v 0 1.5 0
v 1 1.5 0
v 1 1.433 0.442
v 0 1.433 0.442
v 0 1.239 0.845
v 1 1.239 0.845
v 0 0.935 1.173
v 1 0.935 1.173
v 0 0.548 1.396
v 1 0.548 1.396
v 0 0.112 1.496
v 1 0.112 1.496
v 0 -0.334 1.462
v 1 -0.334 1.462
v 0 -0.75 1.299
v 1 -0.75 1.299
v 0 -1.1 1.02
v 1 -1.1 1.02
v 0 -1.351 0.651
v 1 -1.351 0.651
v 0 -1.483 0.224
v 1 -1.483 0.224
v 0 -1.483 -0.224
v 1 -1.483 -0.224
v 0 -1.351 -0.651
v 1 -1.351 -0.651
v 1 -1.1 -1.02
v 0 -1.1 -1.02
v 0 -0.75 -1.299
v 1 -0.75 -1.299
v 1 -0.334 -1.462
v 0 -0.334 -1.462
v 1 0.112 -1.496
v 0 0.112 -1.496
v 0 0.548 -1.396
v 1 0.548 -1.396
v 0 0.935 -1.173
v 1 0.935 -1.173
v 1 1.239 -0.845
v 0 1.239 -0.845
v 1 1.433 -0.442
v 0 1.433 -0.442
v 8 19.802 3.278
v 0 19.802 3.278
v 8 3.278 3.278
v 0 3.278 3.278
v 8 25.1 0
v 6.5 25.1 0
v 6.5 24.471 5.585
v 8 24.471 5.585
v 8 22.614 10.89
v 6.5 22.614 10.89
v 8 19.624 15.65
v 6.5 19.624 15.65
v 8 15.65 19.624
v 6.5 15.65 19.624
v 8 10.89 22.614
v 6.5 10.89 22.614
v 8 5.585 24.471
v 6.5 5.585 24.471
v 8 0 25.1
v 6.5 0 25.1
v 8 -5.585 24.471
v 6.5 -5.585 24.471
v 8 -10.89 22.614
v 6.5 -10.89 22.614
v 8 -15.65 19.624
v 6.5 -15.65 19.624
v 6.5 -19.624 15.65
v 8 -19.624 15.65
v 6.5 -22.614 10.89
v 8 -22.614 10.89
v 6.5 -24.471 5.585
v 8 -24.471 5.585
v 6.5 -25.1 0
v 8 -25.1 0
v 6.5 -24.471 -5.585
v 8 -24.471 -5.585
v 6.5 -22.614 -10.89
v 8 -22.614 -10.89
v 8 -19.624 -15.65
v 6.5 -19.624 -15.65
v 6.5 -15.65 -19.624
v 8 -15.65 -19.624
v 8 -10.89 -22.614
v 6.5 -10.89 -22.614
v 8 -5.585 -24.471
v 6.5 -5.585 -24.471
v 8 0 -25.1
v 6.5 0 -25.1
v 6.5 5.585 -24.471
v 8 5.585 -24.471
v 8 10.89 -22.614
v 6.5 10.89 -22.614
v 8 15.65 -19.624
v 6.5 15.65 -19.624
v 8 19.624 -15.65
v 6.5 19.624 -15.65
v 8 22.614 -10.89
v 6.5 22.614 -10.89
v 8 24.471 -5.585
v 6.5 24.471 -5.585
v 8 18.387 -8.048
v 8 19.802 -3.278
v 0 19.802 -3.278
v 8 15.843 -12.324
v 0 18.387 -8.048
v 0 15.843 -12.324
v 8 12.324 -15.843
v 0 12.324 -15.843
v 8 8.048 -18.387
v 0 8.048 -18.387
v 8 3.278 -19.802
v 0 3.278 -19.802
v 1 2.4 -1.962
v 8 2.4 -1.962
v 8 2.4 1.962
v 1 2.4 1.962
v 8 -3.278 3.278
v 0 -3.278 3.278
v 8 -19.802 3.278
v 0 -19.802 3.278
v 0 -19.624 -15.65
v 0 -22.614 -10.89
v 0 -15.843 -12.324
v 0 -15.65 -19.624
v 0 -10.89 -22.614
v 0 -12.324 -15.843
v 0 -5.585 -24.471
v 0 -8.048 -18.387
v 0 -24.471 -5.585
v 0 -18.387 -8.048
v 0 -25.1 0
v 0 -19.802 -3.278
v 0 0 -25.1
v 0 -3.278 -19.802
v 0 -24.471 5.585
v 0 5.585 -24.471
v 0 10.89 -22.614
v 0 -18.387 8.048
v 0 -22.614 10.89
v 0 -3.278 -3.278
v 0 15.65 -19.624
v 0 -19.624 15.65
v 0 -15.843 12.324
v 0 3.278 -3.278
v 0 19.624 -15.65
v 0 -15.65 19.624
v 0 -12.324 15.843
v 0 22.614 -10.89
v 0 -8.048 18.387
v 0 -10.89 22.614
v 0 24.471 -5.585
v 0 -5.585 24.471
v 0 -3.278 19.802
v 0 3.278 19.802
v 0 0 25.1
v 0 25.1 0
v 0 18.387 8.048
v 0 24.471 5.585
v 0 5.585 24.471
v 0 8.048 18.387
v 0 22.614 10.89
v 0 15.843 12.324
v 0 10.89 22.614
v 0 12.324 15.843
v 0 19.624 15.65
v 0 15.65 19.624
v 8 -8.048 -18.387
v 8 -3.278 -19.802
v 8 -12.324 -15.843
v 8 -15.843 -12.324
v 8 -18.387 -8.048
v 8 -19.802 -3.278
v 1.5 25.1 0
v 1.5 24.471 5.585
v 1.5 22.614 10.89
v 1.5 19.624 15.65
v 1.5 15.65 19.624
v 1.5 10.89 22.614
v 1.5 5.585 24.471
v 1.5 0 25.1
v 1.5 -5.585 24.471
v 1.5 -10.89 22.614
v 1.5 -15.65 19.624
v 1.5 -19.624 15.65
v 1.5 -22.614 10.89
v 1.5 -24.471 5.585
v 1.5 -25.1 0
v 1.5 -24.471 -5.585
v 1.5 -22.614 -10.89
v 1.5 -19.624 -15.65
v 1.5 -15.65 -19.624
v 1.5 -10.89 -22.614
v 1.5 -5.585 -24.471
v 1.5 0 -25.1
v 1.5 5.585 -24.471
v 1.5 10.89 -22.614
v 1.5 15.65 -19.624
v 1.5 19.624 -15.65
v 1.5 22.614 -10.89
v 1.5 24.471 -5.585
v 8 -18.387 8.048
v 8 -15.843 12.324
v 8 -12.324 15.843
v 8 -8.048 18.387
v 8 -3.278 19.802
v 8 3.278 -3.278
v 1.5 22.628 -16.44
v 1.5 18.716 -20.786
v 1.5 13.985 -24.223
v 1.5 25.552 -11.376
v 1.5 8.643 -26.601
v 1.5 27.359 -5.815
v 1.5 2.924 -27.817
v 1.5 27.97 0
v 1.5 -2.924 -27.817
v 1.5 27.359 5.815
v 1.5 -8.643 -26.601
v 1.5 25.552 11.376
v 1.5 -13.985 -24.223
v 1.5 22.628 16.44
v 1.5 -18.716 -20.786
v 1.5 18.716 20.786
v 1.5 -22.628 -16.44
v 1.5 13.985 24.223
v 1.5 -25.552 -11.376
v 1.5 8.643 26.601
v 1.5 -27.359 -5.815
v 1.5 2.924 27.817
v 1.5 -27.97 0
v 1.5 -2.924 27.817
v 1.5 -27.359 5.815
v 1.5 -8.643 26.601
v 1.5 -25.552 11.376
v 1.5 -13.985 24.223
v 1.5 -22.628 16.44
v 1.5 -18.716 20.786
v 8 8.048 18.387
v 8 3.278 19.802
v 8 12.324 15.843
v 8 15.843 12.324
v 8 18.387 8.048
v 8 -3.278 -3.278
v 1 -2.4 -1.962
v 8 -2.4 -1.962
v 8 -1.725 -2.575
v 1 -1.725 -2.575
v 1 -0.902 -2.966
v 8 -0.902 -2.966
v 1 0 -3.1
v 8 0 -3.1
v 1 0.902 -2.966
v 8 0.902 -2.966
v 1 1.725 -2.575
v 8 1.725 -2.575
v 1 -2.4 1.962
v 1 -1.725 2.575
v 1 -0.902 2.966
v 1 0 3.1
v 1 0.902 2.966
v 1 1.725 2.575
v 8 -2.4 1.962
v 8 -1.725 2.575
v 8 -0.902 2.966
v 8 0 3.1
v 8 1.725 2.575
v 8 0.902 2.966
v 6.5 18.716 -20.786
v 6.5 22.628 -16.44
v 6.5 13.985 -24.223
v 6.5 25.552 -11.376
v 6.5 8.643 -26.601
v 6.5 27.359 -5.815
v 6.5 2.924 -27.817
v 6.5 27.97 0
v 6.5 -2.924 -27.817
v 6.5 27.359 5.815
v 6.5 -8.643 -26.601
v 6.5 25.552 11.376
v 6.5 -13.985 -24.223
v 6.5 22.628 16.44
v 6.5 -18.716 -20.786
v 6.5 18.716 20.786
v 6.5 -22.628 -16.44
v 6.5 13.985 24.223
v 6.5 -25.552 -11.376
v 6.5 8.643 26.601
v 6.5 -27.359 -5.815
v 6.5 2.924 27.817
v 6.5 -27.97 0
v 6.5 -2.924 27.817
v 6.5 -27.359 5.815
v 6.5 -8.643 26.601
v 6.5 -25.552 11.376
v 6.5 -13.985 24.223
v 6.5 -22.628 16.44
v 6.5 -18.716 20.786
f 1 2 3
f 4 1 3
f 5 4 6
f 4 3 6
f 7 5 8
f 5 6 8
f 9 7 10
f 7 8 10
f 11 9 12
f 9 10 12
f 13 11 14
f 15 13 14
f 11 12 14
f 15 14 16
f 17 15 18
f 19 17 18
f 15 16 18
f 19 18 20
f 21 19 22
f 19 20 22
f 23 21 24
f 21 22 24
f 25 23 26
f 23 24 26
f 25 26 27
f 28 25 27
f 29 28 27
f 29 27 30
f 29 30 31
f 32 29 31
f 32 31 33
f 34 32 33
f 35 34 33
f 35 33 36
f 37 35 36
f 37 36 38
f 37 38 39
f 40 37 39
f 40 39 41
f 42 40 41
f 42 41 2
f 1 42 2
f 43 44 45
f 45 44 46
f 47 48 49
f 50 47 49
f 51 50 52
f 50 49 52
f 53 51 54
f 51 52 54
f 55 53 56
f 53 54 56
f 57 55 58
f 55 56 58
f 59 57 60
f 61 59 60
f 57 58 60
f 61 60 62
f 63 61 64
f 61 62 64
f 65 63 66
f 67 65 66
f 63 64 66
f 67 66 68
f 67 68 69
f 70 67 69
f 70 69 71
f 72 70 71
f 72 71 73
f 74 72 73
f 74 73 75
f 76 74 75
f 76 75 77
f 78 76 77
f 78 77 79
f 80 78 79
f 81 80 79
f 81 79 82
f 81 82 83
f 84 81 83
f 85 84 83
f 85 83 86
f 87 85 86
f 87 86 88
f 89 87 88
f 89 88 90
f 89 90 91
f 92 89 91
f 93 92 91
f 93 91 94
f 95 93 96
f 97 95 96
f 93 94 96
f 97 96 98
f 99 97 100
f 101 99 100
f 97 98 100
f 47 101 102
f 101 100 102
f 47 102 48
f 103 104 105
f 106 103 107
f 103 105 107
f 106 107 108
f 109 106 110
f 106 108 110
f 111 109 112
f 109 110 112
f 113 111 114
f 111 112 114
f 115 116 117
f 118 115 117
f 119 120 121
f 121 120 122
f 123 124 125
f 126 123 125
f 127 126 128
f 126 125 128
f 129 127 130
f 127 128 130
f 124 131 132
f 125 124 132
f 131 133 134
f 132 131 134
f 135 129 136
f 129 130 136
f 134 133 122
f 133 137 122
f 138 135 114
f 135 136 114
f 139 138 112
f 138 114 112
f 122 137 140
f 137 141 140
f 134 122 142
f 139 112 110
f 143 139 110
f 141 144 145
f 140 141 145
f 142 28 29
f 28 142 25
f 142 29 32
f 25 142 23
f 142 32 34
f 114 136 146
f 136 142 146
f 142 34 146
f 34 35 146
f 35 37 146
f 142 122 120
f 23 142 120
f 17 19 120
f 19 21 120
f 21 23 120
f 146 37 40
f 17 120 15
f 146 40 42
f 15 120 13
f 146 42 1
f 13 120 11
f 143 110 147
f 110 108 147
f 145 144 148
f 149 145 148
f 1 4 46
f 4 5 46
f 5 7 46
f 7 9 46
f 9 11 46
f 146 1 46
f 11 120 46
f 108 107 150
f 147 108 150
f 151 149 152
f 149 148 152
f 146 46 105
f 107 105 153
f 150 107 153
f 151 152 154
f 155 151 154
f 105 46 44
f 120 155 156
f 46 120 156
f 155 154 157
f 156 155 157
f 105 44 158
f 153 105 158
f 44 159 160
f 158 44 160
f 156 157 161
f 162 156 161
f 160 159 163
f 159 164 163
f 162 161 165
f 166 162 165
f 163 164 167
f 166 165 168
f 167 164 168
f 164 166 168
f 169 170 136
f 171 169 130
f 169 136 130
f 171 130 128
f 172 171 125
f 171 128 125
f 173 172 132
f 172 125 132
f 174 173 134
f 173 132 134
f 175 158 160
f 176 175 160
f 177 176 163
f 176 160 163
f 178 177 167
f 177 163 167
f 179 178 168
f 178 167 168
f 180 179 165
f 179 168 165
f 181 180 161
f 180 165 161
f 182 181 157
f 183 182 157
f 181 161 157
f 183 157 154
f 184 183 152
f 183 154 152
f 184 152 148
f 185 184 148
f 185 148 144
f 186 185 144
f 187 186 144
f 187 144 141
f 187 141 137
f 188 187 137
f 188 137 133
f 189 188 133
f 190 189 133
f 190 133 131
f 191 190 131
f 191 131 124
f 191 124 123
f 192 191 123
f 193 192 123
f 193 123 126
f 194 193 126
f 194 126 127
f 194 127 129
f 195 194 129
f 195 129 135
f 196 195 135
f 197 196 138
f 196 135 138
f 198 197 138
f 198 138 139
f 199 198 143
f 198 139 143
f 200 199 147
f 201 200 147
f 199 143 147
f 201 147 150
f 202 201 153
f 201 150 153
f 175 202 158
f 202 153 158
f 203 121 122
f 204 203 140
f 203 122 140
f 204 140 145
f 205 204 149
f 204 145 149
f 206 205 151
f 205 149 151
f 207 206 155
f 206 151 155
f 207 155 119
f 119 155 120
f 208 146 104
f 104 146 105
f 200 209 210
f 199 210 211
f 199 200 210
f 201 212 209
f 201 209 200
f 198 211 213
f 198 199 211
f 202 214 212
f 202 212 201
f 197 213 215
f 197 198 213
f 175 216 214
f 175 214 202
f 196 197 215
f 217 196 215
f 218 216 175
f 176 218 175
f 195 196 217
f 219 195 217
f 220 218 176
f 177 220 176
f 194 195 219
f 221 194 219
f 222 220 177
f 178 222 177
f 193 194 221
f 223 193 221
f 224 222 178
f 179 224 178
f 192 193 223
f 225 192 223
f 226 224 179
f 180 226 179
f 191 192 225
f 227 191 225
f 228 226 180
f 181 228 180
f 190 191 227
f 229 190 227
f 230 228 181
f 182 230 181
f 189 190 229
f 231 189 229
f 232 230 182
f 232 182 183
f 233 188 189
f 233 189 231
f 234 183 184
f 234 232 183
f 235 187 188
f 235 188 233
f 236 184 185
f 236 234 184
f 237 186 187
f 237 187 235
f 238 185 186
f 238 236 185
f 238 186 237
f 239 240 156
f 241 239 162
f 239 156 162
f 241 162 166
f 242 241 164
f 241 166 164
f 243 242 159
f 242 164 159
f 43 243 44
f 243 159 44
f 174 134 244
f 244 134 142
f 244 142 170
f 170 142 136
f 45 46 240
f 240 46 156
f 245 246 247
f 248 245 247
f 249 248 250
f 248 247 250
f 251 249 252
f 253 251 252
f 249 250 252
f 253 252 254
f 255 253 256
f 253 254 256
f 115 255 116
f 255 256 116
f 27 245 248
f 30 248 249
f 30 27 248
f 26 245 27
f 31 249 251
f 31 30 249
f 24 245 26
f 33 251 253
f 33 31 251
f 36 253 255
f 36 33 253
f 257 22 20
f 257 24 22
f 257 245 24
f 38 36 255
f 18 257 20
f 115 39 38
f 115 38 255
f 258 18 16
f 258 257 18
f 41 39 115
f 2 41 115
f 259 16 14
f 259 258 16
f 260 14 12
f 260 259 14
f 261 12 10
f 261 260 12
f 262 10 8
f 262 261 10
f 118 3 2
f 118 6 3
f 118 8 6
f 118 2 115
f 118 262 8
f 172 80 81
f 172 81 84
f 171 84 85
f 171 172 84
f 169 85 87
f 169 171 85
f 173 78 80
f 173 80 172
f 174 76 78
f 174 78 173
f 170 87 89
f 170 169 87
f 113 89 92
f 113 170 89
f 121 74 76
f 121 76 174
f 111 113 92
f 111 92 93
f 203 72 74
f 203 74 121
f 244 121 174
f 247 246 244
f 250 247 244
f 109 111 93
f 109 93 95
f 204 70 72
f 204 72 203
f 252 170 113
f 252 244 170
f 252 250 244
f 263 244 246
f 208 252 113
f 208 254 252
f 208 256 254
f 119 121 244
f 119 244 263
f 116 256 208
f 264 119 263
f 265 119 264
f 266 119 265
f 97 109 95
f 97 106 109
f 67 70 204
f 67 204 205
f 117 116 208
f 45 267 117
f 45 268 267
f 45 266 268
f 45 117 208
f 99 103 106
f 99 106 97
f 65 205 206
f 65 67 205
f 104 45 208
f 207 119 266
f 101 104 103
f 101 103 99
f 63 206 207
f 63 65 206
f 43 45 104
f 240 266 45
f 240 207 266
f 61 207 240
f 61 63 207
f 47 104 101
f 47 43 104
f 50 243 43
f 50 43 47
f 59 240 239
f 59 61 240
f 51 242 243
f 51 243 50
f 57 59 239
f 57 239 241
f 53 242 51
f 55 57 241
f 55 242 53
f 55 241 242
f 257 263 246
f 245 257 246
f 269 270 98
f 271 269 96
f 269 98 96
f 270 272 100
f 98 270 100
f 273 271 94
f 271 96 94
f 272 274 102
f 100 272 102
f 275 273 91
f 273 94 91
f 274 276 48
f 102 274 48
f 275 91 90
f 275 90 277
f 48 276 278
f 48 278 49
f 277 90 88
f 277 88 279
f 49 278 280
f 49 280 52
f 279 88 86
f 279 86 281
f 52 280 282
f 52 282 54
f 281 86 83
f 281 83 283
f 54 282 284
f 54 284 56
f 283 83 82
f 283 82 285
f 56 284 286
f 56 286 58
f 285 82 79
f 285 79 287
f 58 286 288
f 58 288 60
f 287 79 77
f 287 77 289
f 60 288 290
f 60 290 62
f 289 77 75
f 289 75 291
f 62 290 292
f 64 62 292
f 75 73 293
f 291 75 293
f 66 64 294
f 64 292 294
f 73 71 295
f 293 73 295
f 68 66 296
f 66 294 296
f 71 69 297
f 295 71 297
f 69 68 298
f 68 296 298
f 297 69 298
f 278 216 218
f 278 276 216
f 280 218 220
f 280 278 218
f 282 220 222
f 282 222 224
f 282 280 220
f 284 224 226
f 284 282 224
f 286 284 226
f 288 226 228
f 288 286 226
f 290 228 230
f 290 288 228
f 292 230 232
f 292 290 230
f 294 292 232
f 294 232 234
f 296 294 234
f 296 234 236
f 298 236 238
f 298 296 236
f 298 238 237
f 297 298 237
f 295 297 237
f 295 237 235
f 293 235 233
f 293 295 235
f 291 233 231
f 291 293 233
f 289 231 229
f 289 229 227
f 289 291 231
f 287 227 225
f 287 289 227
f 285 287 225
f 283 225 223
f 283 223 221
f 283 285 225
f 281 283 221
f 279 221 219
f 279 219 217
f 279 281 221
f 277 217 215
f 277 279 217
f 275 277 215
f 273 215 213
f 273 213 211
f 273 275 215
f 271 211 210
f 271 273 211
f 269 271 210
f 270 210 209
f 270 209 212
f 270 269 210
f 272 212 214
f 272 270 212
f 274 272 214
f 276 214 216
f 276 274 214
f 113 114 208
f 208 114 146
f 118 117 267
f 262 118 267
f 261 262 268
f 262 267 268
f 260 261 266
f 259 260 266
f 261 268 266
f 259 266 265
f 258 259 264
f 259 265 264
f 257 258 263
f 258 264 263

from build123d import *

# Parameters (mm, degrees)
F0_R     = 25.1
F1_DEPTH = 8
F3_DEPTH = 7
F4_R     = 1.5
F5_DEPTH = 25
F6_W     = 5
F6_H     = 2.87


with BuildPart() as f1:
    # F0 (on Right) → F1 (new body)
    with BuildSketch(Plane.YZ):
        Circle(F0_R)
        with BuildLine():
            ThreePointArc((-3.277508, -19.802201), (-14.192766, -14.192766), (-19.802201, -3.277508))
            Line((-19.802201, -3.277508), (-3.277508, -3.277508))
            Line((-3.277508, -3.277508), (-3.277508, -19.802201))
        make_face(mode=Mode.SUBTRACT)
        with BuildLine():
            ThreePointArc((19.802201, -3.277508), (14.192766, -14.192766), (3.277508, -19.802201))
            Line((3.277508, -19.802201), (3.277508, -3.277508))
            Line((3.277508, -3.277508), (19.802201, -3.277508))
        make_face(mode=Mode.SUBTRACT)
        with BuildLine():
            ThreePointArc((-19.802201, 3.277508), (-14.192766, 14.192766), (-3.277508, 19.802201))
            Line((-3.277508, 19.802201), (-3.277508, 3.277508))
            Line((-3.277508, 3.277508), (-19.802201, 3.277508))
        make_face(mode=Mode.SUBTRACT)
        with BuildLine():
            Line((3.277508, 3.277508), (3.277508, 19.802201))
            ThreePointArc((3.277508, 19.802201), (14.192766, 14.192766), (19.802201, 3.277508))
            Line((19.802201, 3.277508), (3.277508, 3.277508))
        make_face(mode=Mode.SUBTRACT)
    extrude(amount=F1_DEPTH)

    # F2 (on face) → F3 (cut)
    with BuildSketch(Plane.YZ.offset(8)):
        with BuildLine():
            Line((-2.4, 1.962142), (-2.4, -1.962142))
            ThreePointArc((-2.4, -1.962142), (0, -3.1), (2.4, -1.962142))
            Line((2.4, -1.962142), (2.4, 1.962142))
            ThreePointArc((2.4, 1.962142), (0, 3.1), (-2.4, 1.962142))
        make_face()
    extrude(amount=-F3_DEPTH, mode=Mode.SUBTRACT)

    # F4 (on face) → F5 (cut)
    with BuildSketch(Plane.YZ.offset(1)):
        Circle(F4_R)
    extrude(amount=-F5_DEPTH, mode=Mode.SUBTRACT)

    # F6 (on Top) → F7 (revolve)
    with BuildSketch(Plane.XY):
        with Locations((4, 26.535)):
            Rectangle(F6_W, F6_H)
    revolve(axis=Axis((8, 0, 0), (1, 0, 0)))


solid = f1.part
